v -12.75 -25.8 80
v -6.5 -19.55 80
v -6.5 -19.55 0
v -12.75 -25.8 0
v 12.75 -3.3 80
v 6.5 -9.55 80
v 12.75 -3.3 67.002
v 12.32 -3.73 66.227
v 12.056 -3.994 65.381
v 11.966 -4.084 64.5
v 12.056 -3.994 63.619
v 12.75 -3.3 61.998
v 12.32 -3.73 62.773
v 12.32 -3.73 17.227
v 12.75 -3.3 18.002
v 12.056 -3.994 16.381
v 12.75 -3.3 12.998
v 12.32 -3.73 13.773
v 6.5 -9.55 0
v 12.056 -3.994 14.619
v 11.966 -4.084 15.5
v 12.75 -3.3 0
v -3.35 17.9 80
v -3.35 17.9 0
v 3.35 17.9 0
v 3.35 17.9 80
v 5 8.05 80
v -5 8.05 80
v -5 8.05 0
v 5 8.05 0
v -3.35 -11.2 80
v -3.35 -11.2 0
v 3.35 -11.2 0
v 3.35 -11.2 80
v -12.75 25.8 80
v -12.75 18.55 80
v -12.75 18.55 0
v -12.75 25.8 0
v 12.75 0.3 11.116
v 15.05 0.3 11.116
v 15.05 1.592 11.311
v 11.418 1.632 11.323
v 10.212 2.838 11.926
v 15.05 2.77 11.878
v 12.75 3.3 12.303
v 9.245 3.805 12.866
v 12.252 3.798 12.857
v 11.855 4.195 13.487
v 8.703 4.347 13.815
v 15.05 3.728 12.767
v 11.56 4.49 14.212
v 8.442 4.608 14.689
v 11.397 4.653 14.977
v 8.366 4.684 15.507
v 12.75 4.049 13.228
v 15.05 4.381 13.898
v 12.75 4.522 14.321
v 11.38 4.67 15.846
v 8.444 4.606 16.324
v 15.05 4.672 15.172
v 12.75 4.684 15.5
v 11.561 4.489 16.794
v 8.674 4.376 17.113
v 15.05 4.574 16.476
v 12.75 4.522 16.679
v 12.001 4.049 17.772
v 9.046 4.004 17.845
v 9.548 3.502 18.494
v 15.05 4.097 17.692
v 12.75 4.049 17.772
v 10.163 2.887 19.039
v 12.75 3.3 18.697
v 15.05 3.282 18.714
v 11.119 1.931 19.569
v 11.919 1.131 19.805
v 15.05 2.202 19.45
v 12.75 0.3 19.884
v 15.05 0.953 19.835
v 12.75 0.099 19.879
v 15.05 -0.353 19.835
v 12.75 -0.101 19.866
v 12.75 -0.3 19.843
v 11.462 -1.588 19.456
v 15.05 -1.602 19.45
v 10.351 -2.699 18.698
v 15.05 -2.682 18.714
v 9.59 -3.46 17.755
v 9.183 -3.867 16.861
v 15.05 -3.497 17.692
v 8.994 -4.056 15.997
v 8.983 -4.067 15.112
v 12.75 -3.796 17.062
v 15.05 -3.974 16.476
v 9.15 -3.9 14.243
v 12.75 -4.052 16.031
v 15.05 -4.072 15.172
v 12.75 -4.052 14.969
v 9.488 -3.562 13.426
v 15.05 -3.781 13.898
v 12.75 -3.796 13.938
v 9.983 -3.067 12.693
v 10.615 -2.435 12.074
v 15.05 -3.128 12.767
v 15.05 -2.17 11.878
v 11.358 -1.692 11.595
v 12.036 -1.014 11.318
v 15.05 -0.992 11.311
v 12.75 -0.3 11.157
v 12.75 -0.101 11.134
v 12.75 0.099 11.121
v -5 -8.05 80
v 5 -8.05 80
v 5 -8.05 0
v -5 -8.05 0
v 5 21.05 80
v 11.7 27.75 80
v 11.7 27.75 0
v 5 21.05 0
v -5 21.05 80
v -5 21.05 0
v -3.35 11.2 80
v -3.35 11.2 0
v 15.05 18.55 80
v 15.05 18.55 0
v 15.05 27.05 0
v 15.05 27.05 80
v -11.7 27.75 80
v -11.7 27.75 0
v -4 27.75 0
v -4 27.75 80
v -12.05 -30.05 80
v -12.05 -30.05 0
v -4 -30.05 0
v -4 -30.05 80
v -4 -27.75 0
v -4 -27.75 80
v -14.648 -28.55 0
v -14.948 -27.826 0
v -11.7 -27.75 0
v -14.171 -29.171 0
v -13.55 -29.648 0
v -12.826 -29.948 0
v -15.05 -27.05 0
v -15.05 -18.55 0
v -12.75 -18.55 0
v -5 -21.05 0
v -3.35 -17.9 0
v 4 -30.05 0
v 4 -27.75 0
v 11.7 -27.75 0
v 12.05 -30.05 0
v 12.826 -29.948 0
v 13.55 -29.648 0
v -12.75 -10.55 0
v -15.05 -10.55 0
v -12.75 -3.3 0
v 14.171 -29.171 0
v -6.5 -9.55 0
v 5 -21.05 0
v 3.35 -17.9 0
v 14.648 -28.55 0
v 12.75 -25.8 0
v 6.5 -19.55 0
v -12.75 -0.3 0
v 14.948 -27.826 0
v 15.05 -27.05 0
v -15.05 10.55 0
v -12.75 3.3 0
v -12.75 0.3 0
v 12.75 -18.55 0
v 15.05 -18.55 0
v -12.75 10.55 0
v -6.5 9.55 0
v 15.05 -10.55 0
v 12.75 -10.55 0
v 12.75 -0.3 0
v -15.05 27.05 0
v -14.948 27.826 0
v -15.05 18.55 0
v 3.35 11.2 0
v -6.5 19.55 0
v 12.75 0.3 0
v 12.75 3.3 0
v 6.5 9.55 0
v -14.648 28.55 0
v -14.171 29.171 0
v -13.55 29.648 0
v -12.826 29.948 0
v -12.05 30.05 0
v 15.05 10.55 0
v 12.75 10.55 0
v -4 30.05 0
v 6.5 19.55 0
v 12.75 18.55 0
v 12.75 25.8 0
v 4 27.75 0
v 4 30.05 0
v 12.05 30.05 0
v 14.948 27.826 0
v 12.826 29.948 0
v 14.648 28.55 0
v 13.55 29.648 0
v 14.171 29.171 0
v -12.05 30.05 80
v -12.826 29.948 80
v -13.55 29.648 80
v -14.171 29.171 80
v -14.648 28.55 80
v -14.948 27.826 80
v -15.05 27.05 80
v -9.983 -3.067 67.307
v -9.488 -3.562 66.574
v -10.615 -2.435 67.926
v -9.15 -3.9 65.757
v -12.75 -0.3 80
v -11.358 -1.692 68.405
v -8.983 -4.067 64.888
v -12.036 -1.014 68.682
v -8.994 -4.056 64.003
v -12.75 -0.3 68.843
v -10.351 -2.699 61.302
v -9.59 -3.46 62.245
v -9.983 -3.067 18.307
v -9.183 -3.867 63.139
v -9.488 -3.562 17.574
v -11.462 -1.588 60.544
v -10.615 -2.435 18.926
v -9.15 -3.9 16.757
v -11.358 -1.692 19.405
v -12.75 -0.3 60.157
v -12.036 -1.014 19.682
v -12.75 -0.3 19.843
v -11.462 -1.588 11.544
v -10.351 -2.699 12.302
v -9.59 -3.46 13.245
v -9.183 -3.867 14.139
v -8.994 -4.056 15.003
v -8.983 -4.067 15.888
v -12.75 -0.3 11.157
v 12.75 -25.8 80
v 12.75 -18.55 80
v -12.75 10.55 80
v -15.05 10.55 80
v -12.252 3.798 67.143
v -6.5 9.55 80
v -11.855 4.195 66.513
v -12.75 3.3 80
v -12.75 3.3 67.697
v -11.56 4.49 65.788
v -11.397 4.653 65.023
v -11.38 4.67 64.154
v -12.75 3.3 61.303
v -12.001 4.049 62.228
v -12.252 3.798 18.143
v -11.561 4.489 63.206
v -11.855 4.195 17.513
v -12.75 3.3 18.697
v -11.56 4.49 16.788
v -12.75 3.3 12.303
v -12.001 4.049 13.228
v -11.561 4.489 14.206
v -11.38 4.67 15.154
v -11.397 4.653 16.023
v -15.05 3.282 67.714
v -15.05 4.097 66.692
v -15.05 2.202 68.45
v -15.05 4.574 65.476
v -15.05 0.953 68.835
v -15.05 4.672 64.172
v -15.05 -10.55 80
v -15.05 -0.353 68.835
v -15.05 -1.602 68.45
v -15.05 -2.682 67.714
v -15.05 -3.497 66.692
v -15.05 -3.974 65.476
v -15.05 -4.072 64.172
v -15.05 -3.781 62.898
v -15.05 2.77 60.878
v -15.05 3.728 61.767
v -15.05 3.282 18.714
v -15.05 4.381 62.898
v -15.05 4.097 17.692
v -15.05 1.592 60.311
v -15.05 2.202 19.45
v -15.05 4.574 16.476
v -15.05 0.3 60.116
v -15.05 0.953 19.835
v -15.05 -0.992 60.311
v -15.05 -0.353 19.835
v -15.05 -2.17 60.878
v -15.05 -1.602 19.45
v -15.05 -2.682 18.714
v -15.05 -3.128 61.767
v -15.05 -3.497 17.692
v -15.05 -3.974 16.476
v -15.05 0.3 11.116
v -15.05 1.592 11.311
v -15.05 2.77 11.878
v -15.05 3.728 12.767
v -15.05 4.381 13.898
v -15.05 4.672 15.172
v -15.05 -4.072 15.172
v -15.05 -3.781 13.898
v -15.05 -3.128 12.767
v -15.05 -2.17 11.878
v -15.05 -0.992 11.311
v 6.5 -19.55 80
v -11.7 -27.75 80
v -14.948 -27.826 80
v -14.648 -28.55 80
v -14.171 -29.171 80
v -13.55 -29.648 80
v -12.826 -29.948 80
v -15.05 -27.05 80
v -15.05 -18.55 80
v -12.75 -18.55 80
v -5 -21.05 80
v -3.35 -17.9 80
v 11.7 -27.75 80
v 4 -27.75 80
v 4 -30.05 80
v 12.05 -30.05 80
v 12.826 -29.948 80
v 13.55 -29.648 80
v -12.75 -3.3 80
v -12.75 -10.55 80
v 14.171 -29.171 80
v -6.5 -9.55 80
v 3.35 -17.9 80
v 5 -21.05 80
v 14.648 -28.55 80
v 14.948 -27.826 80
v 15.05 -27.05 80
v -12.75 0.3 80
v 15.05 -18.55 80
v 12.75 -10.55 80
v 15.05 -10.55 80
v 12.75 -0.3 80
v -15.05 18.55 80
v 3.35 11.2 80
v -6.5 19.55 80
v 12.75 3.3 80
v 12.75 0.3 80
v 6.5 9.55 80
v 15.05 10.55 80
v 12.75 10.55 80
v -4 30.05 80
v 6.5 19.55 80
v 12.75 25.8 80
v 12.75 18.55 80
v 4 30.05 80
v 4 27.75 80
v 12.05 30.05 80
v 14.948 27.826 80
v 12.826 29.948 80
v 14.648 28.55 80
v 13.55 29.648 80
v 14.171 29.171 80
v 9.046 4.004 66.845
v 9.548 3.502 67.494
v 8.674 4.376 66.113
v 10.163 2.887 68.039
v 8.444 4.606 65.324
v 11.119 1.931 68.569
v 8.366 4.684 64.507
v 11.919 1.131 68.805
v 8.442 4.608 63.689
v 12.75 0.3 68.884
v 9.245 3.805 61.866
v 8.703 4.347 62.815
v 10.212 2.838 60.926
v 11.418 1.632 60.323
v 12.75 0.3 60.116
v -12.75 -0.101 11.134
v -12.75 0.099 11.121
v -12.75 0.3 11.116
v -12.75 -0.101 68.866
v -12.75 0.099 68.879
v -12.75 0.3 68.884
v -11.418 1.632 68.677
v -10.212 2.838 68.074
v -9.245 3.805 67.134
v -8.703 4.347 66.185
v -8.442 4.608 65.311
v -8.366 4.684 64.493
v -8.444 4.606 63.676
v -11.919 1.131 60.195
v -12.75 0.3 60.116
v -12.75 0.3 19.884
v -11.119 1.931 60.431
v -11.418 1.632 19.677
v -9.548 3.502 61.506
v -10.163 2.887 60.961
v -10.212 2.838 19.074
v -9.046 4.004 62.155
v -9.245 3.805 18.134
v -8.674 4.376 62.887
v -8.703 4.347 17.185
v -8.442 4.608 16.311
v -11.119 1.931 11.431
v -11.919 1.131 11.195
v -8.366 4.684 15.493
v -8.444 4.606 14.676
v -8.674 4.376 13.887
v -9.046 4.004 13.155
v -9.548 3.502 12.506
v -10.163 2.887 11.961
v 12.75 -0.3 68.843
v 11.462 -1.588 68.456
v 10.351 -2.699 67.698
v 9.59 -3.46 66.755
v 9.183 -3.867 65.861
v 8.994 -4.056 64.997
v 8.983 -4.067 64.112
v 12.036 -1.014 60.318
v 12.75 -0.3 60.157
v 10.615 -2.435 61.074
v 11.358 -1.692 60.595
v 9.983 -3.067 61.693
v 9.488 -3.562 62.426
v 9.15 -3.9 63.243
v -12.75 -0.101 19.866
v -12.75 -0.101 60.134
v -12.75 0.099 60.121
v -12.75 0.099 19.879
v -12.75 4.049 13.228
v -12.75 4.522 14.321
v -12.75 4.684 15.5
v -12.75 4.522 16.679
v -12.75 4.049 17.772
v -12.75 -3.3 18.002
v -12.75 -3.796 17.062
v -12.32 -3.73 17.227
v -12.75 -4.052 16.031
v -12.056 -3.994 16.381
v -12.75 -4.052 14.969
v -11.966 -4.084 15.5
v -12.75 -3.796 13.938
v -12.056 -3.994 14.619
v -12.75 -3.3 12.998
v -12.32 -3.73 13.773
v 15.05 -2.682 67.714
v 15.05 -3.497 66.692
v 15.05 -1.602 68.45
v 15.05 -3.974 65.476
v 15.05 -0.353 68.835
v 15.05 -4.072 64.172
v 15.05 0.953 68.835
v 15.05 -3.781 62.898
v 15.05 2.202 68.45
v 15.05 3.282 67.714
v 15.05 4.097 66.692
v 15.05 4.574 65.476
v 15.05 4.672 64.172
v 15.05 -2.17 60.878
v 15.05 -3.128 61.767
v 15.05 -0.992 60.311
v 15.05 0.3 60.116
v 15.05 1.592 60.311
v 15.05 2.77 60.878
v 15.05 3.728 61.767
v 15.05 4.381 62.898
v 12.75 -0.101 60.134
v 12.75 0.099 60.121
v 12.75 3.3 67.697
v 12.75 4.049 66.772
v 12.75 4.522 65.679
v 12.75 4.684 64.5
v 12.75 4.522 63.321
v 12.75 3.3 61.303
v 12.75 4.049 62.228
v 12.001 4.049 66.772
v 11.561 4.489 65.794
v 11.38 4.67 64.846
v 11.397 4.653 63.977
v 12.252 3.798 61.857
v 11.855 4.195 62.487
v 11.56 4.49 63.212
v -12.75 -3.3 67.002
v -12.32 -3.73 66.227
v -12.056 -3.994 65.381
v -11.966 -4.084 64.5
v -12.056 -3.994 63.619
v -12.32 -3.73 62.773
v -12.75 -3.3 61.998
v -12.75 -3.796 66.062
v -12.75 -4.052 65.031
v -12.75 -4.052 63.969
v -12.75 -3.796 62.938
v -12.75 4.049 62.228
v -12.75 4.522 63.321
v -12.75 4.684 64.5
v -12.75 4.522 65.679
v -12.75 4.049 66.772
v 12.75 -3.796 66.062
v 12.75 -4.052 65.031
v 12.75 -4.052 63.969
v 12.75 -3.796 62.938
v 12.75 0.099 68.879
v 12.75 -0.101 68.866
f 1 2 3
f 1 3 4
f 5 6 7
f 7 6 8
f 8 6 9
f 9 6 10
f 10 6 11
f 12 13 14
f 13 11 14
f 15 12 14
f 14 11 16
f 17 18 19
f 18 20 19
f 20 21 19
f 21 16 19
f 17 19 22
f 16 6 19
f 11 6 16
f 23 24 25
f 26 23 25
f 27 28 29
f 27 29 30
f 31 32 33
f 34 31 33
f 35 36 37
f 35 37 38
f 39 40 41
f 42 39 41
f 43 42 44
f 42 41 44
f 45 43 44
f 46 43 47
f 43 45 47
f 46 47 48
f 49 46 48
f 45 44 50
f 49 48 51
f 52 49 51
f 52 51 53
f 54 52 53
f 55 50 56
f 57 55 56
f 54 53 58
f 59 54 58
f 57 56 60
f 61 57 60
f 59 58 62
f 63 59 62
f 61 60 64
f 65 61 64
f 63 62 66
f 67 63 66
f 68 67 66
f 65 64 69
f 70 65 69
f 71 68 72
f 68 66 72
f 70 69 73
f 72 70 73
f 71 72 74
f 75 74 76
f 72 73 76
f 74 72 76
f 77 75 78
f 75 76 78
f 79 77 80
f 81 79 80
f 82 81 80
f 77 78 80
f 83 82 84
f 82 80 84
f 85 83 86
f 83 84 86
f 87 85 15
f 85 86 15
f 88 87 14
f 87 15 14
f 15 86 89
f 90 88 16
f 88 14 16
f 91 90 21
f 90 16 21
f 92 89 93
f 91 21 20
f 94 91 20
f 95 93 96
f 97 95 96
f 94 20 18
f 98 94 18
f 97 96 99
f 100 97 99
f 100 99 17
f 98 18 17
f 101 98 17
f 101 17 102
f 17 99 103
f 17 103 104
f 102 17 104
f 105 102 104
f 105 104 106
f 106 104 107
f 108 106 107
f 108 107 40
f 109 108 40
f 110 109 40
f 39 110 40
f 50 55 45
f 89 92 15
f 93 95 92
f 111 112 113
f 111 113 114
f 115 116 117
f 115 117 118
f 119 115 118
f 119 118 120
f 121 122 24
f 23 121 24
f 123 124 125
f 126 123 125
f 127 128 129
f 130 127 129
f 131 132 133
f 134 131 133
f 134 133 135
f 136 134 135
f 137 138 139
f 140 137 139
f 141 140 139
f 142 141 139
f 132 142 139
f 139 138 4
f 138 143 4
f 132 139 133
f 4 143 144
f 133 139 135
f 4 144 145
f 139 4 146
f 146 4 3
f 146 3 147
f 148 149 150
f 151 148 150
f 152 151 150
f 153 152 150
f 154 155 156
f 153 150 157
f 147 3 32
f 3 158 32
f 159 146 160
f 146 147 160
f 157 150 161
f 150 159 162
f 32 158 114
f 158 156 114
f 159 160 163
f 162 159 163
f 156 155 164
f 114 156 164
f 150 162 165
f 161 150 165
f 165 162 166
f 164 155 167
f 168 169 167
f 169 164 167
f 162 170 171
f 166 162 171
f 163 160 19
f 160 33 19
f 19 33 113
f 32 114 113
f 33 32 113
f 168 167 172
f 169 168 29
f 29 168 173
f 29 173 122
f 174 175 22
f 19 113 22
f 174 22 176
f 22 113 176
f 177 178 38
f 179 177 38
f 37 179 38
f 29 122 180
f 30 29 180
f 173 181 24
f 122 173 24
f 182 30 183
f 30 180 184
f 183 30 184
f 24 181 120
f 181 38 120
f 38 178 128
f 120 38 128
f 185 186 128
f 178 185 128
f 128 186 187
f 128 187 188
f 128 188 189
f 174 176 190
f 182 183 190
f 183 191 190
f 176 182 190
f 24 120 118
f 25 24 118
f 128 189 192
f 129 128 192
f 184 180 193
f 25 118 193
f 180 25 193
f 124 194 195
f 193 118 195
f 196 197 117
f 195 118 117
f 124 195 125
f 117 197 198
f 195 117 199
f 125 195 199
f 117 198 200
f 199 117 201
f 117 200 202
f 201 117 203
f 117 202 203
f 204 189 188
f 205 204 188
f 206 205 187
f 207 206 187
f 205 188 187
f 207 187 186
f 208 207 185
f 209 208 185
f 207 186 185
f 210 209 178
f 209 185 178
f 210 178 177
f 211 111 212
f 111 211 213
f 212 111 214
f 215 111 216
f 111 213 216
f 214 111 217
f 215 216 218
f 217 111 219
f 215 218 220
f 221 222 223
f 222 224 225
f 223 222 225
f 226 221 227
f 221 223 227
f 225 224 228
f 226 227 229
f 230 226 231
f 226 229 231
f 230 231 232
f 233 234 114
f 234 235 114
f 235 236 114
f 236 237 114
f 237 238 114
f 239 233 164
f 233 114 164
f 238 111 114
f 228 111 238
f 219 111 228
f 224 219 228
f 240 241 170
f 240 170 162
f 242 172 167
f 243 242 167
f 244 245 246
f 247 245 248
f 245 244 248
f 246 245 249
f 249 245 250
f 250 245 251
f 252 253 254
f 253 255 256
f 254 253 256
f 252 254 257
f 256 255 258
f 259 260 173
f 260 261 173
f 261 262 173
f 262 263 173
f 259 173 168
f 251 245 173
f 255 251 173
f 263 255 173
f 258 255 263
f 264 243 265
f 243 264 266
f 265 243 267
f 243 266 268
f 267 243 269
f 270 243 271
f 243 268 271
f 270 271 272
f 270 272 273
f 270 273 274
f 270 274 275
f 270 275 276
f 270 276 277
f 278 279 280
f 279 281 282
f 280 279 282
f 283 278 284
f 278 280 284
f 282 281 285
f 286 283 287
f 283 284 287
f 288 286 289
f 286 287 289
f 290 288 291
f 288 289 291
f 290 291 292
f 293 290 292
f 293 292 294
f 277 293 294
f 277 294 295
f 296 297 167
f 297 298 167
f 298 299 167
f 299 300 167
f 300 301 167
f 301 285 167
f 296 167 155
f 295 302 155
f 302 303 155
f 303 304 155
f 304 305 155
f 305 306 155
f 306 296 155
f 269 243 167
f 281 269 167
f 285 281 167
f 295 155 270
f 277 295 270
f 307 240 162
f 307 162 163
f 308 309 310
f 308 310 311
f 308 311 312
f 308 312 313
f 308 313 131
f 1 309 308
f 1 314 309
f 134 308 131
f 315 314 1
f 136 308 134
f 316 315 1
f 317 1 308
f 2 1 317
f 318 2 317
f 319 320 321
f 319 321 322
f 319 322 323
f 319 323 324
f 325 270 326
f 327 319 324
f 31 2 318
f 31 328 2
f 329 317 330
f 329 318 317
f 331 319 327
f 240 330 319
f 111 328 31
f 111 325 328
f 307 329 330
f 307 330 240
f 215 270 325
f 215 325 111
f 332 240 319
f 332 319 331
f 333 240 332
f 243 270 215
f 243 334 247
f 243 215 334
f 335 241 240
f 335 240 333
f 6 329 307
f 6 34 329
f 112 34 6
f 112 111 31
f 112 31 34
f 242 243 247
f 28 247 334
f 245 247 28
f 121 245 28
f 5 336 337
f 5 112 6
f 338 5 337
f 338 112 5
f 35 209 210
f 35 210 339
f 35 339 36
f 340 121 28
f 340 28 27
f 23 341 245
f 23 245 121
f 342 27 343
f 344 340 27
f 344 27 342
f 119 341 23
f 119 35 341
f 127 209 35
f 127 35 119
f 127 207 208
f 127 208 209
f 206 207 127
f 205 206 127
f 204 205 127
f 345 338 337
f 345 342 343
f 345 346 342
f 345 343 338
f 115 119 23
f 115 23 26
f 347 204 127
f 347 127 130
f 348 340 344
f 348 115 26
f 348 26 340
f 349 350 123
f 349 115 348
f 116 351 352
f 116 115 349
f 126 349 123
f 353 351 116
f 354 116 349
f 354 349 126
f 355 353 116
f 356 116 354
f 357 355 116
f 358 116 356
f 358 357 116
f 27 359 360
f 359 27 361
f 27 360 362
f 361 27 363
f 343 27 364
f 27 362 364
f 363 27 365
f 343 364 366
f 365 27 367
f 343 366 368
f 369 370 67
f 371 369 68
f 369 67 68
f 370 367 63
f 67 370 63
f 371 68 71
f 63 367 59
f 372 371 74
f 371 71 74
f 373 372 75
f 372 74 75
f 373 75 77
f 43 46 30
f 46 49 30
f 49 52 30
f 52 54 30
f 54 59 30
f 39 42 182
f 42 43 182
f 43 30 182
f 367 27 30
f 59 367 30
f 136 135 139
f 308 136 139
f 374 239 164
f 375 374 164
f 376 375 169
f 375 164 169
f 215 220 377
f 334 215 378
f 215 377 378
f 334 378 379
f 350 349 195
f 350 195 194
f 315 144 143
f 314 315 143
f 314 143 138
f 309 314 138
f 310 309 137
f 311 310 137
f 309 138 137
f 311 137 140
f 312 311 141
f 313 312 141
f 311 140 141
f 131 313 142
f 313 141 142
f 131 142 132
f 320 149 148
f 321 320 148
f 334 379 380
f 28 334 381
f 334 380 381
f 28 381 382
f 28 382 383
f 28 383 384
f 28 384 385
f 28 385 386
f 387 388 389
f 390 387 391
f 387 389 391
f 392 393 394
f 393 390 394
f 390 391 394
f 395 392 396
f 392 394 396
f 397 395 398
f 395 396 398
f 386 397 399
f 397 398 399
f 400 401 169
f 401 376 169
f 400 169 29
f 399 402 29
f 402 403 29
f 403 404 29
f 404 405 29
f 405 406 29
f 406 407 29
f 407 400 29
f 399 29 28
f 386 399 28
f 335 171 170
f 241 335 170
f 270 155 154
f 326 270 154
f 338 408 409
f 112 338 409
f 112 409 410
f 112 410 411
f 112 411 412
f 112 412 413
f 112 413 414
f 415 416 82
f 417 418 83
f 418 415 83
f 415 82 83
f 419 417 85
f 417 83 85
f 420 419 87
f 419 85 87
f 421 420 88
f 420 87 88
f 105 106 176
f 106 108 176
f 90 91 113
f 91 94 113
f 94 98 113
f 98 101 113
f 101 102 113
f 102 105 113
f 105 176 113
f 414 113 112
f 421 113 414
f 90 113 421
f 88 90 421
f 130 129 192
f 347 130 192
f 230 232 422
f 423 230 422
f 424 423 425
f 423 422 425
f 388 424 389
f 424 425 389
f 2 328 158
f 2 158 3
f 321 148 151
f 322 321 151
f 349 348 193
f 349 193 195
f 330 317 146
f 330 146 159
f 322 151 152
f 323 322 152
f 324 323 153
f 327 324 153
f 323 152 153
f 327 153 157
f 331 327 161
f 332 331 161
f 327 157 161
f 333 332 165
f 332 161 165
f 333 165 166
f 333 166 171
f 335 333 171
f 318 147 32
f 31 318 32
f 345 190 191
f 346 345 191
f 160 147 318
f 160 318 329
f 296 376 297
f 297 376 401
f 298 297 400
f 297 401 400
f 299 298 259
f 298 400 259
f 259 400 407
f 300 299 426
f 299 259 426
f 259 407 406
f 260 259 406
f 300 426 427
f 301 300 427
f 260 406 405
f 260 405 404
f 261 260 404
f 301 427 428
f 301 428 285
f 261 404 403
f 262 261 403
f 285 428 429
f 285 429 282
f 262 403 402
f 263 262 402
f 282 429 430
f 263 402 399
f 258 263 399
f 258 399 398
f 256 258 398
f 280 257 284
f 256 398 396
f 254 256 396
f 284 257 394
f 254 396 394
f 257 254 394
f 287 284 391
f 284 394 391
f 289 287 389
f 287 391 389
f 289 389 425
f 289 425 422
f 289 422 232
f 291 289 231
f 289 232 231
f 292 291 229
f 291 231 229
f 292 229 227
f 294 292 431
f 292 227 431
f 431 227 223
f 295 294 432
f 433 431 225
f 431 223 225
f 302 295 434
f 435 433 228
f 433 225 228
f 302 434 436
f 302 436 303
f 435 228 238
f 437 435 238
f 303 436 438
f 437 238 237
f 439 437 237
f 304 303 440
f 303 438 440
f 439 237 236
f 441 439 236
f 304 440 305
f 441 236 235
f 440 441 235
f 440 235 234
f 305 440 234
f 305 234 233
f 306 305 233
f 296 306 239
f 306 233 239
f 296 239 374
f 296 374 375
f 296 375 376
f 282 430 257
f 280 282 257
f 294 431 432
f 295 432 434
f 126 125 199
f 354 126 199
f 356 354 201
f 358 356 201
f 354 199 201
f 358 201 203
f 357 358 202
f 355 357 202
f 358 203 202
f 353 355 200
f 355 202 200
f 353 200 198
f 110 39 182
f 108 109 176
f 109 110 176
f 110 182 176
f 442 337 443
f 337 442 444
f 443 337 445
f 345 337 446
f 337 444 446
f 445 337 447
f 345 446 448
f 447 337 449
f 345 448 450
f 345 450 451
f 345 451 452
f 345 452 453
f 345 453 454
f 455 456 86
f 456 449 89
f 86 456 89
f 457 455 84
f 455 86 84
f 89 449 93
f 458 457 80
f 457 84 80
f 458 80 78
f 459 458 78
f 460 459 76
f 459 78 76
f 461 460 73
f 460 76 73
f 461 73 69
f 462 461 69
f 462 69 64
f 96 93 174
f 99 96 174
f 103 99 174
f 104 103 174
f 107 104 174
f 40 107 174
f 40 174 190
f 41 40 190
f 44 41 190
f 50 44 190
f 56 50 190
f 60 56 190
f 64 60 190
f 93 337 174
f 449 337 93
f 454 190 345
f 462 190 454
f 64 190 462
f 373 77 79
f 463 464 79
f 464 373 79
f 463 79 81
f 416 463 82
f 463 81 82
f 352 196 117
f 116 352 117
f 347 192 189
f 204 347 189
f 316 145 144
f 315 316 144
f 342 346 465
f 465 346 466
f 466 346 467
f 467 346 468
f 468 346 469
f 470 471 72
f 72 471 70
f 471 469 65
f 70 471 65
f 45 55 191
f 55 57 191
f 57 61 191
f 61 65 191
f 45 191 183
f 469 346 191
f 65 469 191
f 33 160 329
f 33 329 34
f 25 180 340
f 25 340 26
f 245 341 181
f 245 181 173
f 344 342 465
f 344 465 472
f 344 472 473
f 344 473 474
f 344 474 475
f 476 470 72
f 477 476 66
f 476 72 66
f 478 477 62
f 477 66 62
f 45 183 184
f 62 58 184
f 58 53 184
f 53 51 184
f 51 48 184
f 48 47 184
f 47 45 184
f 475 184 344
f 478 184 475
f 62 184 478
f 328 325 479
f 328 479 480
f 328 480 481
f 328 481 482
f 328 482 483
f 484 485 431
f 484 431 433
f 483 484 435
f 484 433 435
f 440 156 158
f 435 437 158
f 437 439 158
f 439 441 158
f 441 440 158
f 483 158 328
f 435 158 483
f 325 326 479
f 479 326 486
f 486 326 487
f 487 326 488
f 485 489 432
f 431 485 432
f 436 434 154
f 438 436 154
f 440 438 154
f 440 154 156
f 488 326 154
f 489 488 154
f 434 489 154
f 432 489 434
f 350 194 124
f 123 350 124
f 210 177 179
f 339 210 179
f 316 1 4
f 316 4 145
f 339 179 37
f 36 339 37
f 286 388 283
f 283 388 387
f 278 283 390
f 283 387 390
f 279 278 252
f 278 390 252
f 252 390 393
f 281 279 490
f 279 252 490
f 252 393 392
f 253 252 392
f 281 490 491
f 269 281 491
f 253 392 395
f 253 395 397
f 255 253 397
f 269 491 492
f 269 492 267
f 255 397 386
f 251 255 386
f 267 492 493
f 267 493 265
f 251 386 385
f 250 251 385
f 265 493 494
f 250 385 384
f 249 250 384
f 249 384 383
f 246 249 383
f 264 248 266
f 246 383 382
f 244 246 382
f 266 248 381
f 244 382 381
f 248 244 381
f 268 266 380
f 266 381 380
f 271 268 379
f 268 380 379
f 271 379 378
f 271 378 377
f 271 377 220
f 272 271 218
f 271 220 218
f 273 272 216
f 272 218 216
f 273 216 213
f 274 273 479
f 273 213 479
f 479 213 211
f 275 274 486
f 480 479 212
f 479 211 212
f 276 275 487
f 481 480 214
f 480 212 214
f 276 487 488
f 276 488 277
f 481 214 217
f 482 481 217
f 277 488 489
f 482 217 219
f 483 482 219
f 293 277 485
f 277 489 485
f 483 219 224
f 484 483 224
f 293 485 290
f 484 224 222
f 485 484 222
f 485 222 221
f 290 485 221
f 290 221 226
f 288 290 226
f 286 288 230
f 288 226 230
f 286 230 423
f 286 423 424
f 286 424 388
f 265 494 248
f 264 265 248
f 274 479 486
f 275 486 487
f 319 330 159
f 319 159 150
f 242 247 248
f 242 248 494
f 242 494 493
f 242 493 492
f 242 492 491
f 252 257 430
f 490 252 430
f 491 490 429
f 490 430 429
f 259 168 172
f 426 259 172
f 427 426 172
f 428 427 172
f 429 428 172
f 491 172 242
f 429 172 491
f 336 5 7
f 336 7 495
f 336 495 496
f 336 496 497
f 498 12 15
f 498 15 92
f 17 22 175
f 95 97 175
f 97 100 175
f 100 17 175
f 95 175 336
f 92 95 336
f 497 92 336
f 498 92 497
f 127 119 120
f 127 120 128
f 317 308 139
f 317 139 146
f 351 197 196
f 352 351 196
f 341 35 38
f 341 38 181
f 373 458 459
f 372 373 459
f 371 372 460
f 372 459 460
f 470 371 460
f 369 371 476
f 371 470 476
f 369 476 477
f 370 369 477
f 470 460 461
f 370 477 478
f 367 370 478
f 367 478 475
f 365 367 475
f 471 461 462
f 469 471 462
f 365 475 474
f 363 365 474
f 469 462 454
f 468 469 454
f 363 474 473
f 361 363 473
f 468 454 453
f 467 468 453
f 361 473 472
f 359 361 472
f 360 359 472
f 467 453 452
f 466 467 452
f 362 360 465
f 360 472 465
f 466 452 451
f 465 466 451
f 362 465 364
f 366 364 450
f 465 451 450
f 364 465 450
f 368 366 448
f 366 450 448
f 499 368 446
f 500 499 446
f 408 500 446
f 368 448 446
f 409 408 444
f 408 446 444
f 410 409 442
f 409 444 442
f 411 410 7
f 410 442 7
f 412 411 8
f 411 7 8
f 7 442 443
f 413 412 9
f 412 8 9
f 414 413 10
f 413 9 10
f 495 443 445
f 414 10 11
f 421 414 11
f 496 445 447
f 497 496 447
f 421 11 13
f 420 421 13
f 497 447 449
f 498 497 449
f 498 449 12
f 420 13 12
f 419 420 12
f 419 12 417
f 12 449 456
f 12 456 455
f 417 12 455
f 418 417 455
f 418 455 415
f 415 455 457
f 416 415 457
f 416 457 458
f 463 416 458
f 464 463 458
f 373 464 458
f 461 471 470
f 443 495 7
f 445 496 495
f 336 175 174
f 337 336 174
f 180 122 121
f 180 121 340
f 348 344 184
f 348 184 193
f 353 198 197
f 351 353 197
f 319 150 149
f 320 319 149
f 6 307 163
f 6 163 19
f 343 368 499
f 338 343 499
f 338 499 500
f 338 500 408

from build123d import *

# Parameters (mm, degrees)
CROQUIS1_W              = 6.7
CROQUIS1_H              = 6.7
SALIENTE_EXTRUIR1_DEPTH = 80
CROQUIS2_R              = 4.38396011
CORTAR_EXTRUIR1_DEPTH   = 34


with BuildPart() as part:
    # Croquis1 → Saliente-Extruir1 (new body)
    with BuildSketch(Plane.XY):
        with BuildLine():
            Line((-12.05, -30.05), (-4, -30.05))
            Line((-4, -30.05), (-4, -27.75))
            Line((-4, -27.75), (-11.7, -27.75))
            Line((-11.7, -27.75), (-5, -21.05))
            Line((-5, -21.05), (5, -21.05))
            Line((5, -21.05), (11.7, -27.75))
            Line((11.7, -27.75), (4, -27.75))
            Line((4, -27.75), (4, -30.05))
            Line((4, -30.05), (12.05, -30.05))
            ThreePointArc((12.05, -30.05), (14.171320344, -29.171320344), (15.05, -27.05))
            Line((15.05, -27.05), (15.05, -18.55))
            Line((15.05, -18.55), (12.75, -18.55))
            Line((12.75, -18.55), (12.75, -25.8))
            Line((12.75, -25.8), (6.5, -19.55))
            Line((6.5, -19.55), (6.5, -9.55))
            Line((6.5, -9.55), (12.75, -3.3))
            Line((12.75, -3.3), (12.75, -10.55))
            Line((12.75, -10.55), (15.05, -10.55))
            Line((15.05, -10.55), (15.05, 10.55))
            Line((15.05, 10.55), (12.75, 10.55))
            Line((12.75, 10.55), (12.75, 3.3))
            Line((12.75, 3.3), (6.5, 9.55))
            Line((6.5, 9.55), (6.5, 19.55))
            Line((6.5, 19.55), (12.75, 25.8))
            Line((12.75, 25.8), (12.75, 18.55))
            Line((12.75, 18.55), (15.05, 18.55))
            Line((15.05, 18.55), (15.05, 27.05))
            ThreePointArc((15.05, 27.05), (14.171320344, 29.171320344), (12.05, 30.05))
            Line((12.05, 30.05), (4, 30.05))
            Line((4, 30.05), (4, 27.75))
            Line((4, 27.75), (11.7, 27.75))
            Line((11.7, 27.75), (5, 21.05))
            Line((5, 21.05), (-5, 21.05))
            Line((-5, 21.05), (-11.7, 27.75))
            Line((-11.7, 27.75), (-4, 27.75))
            Line((-4, 27.75), (-4, 30.05))
            Line((-4, 30.05), (-12.05, 30.05))
            ThreePointArc((-12.05, 30.05), (-14.171320344, 29.171320344), (-15.05, 27.05))
            Line((-15.05, 27.05), (-15.05, 18.55))
            Line((-15.05, 18.55), (-12.75, 18.55))
            Line((-12.75, 18.55), (-12.75, 25.8))
            Line((-12.75, 25.8), (-6.5, 19.55))
            Line((-6.5, 19.55), (-6.5, 9.55))
            Line((-6.5, 9.55), (-12.75, 3.3))
            Line((-12.75, 3.3), (-12.75, 10.55))
            Line((-12.75, 10.55), (-15.05, 10.55))
            Line((-15.05, 10.55), (-15.05, -10.55))
            Line((-15.05, -10.55), (-12.75, -10.55))
            Line((-12.75, -10.55), (-12.75, -3.3))
            Line((-12.75, -3.3), (-6.5, -9.55))
            Line((-6.5, -9.55), (-6.5, -19.55))
            Line((-6.5, -19.55), (-12.75, -25.8))
            Line((-12.75, -25.8), (-12.75, -18.55))
            Line((-12.75, -18.55), (-15.05, -18.55))
            Line((-15.05, -18.55), (-15.05, -27.05))
            ThreePointArc((-15.05, -27.05), (-14.171320344, -29.171320344), (-12.05, -30.05))
        make_face()
        Polygon((-5, 8.05), (5, 8.05), (11.7, 1.35), (12.75, 0.3), (12.75, -0.3), (11.7, -1.35), (5, -8.05), (-5, -8.05), (-11.7, -1.35), (-12.75, -0.3), (-12.75, 0.3), (-11.7, 1.35), align=None, mode=Mode.SUBTRACT)
        with Locations((0, 14.55)):
            Rectangle(CROQUIS1_W, CROQUIS1_H, mode=Mode.SUBTRACT)
        with Locations((0, -14.55)):
            Rectangle(CROQUIS1_W, CROQUIS1_H, mode=Mode.SUBTRACT)
    extrude(amount=SALIENTE_EXTRUIR1_DEPTH)

    # Croquis2 → Cortar-Extruir1 (cut)
    with BuildSketch(Plane(origin=(15.05, 0, 0), x_dir=(0, 0, -1), z_dir=(1, 0, 0))):
        with Locations((-64.5, 0.3)):
            Circle(CROQUIS2_R)
        with Locations((-15.5, 0.3)):
            Circle(CROQUIS2_R)
    extrude(amount=-CORTAR_EXTRUIR1_DEPTH, mode=Mode.SUBTRACT)


solid = part.part
